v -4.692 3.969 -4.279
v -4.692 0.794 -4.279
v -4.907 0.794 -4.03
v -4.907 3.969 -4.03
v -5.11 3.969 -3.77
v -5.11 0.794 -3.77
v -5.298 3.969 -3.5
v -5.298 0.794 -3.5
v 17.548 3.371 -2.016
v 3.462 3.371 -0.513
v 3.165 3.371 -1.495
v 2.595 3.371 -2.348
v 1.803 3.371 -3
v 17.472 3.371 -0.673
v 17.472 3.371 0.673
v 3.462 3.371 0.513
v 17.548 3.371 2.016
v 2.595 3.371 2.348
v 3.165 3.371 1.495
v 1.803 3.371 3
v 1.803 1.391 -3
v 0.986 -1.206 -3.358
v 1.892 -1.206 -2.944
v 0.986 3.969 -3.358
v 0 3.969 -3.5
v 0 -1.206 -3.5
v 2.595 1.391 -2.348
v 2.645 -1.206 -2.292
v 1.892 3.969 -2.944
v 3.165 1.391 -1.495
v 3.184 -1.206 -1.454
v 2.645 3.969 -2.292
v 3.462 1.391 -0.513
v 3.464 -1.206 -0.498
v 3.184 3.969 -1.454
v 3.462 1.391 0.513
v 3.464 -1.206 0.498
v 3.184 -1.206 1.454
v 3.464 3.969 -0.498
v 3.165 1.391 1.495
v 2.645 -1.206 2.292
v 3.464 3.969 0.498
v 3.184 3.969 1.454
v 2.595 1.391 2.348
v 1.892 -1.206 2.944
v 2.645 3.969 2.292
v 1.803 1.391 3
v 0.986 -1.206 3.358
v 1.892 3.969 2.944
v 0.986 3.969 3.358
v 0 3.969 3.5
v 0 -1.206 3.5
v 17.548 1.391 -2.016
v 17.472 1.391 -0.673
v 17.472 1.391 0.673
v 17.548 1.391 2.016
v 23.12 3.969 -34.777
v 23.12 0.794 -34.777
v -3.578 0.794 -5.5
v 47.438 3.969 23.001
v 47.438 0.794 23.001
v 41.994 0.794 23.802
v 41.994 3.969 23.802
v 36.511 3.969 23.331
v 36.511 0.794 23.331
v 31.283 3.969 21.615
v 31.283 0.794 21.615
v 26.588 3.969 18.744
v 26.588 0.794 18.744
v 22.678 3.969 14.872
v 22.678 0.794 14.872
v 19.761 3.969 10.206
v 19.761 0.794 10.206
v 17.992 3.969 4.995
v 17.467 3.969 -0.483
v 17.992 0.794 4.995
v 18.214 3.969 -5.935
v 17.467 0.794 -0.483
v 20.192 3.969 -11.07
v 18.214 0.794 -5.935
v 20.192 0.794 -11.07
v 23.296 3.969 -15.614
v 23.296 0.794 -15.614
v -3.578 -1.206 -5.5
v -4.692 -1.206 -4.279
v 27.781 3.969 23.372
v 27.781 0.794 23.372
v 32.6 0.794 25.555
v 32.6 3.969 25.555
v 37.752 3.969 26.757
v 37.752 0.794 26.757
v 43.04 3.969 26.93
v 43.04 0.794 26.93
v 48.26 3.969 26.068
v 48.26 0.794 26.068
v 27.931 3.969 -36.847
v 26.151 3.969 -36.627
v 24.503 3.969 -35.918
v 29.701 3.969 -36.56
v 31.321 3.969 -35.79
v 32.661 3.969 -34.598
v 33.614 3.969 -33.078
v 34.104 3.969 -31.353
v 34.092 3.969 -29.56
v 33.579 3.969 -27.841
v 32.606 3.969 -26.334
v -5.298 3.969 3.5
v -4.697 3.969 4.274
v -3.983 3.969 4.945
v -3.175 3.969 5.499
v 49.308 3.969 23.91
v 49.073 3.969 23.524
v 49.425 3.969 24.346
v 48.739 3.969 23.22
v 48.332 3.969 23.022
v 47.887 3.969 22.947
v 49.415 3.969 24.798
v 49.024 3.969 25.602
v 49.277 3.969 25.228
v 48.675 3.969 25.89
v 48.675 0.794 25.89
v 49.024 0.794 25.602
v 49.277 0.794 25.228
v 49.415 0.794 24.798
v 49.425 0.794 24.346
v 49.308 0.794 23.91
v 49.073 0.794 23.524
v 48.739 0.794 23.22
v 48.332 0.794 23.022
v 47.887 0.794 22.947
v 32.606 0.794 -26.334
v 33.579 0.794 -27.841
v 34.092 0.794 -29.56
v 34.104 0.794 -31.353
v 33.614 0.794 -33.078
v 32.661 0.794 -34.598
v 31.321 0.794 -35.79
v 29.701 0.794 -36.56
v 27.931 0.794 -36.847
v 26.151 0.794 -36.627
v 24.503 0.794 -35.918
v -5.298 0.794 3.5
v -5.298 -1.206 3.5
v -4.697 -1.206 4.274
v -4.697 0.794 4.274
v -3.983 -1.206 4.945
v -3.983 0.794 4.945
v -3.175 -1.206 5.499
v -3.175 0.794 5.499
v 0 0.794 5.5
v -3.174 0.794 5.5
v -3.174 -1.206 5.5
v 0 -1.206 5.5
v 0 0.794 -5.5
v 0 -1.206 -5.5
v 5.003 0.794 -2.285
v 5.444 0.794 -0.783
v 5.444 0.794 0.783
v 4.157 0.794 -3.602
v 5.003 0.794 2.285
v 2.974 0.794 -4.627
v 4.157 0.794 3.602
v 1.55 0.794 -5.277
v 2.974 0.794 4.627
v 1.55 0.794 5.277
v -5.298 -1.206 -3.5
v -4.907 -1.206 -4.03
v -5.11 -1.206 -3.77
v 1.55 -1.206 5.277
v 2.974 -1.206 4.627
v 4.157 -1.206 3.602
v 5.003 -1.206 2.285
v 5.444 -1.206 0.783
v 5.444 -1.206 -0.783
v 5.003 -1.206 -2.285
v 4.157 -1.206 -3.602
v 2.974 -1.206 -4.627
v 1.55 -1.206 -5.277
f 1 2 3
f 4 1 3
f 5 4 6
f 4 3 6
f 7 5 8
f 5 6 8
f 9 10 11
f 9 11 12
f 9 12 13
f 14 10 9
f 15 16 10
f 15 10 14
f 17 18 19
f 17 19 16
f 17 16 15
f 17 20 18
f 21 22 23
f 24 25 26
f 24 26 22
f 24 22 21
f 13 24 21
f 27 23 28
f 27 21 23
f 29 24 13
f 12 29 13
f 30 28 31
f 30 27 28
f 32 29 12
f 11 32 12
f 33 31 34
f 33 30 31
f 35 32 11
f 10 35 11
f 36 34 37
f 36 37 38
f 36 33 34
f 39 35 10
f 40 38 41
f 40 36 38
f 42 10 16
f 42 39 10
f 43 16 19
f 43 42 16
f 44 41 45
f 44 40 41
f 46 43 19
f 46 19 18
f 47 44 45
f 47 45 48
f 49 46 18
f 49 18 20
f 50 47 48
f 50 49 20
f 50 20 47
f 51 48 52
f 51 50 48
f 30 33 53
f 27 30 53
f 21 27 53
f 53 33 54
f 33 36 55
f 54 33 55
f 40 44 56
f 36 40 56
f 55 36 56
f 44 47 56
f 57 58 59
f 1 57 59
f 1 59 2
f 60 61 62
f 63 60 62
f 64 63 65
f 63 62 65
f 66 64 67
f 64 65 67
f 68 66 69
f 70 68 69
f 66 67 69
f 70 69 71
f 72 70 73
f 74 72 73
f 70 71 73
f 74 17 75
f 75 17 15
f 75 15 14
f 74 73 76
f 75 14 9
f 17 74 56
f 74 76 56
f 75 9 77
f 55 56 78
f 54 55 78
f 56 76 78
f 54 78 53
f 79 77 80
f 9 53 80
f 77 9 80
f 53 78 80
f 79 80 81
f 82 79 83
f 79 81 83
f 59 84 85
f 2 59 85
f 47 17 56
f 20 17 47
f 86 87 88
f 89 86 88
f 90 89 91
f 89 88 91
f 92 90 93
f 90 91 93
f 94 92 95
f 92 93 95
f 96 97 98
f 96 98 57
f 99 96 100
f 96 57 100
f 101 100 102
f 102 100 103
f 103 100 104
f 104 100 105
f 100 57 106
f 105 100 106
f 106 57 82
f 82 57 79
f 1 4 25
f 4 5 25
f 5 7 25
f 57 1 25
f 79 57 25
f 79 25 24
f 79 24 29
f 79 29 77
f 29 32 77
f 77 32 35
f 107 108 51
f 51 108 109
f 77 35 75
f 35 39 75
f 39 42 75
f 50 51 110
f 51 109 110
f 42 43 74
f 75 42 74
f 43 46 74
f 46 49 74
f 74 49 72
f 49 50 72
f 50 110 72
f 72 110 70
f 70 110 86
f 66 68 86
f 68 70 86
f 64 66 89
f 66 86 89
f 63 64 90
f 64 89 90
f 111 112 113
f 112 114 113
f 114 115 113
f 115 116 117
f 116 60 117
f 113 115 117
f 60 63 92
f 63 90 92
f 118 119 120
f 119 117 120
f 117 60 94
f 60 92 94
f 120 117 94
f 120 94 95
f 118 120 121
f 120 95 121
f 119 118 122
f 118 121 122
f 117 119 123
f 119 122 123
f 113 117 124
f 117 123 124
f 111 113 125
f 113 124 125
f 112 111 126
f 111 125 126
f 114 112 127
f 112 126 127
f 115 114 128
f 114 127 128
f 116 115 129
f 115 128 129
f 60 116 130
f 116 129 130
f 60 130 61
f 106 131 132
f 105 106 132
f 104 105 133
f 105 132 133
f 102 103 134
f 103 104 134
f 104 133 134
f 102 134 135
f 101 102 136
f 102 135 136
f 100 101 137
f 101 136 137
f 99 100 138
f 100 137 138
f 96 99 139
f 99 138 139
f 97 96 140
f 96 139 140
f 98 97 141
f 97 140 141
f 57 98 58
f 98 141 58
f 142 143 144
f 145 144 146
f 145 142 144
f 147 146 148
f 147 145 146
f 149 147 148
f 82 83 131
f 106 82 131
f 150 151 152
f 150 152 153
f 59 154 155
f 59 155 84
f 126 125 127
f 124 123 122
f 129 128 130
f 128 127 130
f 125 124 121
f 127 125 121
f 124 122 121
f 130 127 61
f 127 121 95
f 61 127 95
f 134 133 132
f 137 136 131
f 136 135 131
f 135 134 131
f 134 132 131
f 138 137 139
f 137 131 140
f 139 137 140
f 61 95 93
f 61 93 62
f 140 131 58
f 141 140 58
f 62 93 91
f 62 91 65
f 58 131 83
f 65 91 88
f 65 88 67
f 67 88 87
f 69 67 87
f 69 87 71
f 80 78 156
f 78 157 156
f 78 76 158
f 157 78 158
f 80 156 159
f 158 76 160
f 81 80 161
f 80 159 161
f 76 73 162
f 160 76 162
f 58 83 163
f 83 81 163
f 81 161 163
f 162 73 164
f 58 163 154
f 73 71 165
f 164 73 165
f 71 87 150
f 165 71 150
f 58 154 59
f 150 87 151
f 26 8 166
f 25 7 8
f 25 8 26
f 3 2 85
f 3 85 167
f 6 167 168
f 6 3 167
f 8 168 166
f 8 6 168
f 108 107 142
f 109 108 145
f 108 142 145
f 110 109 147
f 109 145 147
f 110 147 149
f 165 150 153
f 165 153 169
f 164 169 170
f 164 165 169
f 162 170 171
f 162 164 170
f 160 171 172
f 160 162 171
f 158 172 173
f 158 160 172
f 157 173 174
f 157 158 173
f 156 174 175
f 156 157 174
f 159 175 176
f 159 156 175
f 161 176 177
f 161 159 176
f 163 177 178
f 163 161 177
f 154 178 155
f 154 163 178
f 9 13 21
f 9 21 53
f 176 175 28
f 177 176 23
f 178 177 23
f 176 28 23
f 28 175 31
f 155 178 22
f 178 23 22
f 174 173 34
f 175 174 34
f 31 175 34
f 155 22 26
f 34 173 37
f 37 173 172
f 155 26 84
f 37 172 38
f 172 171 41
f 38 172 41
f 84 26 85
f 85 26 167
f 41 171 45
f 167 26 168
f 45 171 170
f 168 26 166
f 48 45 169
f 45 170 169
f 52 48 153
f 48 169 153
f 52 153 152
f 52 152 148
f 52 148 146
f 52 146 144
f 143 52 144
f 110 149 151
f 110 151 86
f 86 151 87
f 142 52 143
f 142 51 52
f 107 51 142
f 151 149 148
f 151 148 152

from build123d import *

# Parameters (mm, degrees)
BOSS_EXTRUDE1_DEPTH = 4.7625
SKETCH5_R           = 3.5000057
CUT_EXTRUDE2_DEPTH  = 3.37125
CUT_EXTRUDE3_DEPTH  = 1.98
SKETCH10_W          = 6.35
SKETCH10_H          = 0.79375
SKETCH10_W_2        = 35.745198541
SKETCH10_W_3        = 19.548012242
CUT_EXTRUDE4_DEPTH  = 63.97959256
CUT_EXTRUDE5_DEPTH  = 2.54
BOSS_EXTRUDE2_DEPTH = 2


with BuildPart() as part:
    # Sketch1 → Boss-Extrude1 (new body)
    with BuildSketch(Plane(origin=(0, 0, 0), x_dir=(1, 0, 0), z_dir=(0, 1, 0))):
        with BuildLine():
            ThreePointArc((47.438128512, -23.001108739), (21.083895316, -12.623567162), (23.295952901, 15.613744639))
            Line((23.295952901, 15.613744639), (32.606191406, 26.334377035))
            ThreePointArc((32.606191406, 26.334377035), (32.033289602, 35.241600739), (23.119772343, 34.776777479))
            Line((23.119772343, 34.776777479), (-4.692006503, 4.278735207))
            ThreePointArc((-4.692006503, 4.278735207), (-6.274930424, -0.973523588), (-3.175, -5.499261314))
            Line((-3.175, -5.499261314), (27.78125, -23.371860585))
            ThreePointArc((27.78125, -23.371860585), (37.752424387, -26.756618196), (48.25987898, -26.067923237))
            ThreePointArc((48.25987898, -26.067923237), (49.382410995, -24.123640754), (47.438128512, -23.001108739))
        make_face()
    extrude(amount=BOSS_EXTRUDE1_DEPTH)

    # Sketch5 → Cut-Extrude2 (cut)
    with BuildSketch(Plane.XZ):
        Circle(SKETCH5_R)
        with BuildLine():
            ThreePointArc((0, -3.5000057), (-3.5000057, 0), (0, 3.5000057))
            Line((0, 3.5000057), (-5.298345034, 3.5000057))
            ThreePointArc((-5.298345034, 3.5000057), (-6.35, 0), (-5.298345034, -3.5000057))
            Line((-5.298345034, -3.5000057), (0, -3.5000057))
        make_face()
    extrude(amount=-CUT_EXTRUDE2_DEPTH, mode=Mode.SUBTRACT)

    # Sketch6 → Cut-Extrude3 (cut)
    with BuildSketch(Plane.XZ.offset(-3.37125)):
        with BuildLine():
            Line((17.802786704, -2), (17.802786704, 2))
            Line((17.802786704, 2), (1.802786704, 3))
            ThreePointArc((1.802786704, 3), (3.5000057, 0), (1.802786704, -3))
            Line((1.802786704, -3), (17.802786704, -2))
        make_face()
    extrude(amount=CUT_EXTRUDE3_DEPTH, mode=Mode.SUBTRACT)

    # Sketch10 → Cut-Extrude4 (cut, through all)
    with BuildSketch(Plane(origin=(-3.175, 0, 5.499261314), x_dir=(0.866025404, 0, 0.5), z_dir=(-0.5, 0, 0.866025404))):
        with Locations((-3.175, 4.365625)):
            Rectangle(SKETCH10_W, SKETCH10_H)
        with Locations((17.872599271, 4.365625)):
            Rectangle(SKETCH10_W_2, SKETCH10_H)
        with Locations((45.519204662, 4.365625)):
            Rectangle(SKETCH10_W_3, SKETCH10_H)
        with Locations((45.519204662, 0.396875)):
            Rectangle(SKETCH10_W_3, SKETCH10_H)
        with Locations((17.872599271, 0.396875)):
            Rectangle(SKETCH10_W_2, SKETCH10_H)
        with Locations((-3.175, 0.396875)):
            Rectangle(SKETCH10_W, SKETCH10_H)
    extrude(amount=-CUT_EXTRUDE4_DEPTH, mode=Mode.SUBTRACT)

    # Sketch11 → Cut-Extrude5 (cut)
    with BuildSketch(Plane.XZ.offset(-3.37125)):
        with BuildLine():
            Line((-5.298345034, 3.5000057), (0, 3.5000057))
            ThreePointArc((0, 3.5000057), (3.5000057, 0), (0, -3.5000057))
            Line((0, -3.5000057), (-5.298345034, -3.5000057))
            ThreePointArc((-5.298345034, -3.5000057), (-6.35, 0), (-5.298345034, 3.5000057))
        make_face()
    extrude(amount=-CUT_EXTRUDE5_DEPTH, mode=Mode.SUBTRACT)

    # Sketch12 → Boss-Extrude2 (add)
    with BuildSketch(Plane.XZ.offset(-0.79375)):
        with BuildLine():
            Line((-3.175, 5.499261314), (-3.173710686, 5.5000057))
            Line((-3.173710686, 5.5000057), (0, 5.5000057))
            ThreePointArc((0, 5.5000057), (5.5000057, 0), (0, -5.5000057))
            Line((0, -5.5000057), (-3.57830535, -5.5000057))
            Line((-3.57830535, -5.5000057), (-4.692006503, -4.278735207))
            ThreePointArc((-4.692006503, -4.278735207), (-5.010327921, -3.901168303), (-5.298345034, -3.5000057))
            Line((-5.298345034, -3.5000057), (0, -3.5000057))
            ThreePointArc((0, -3.5000057), (3.5000057, 0), (0, 3.5000057))
            Line((0, 3.5000057), (-5.298345034, 3.5000057))
            ThreePointArc((-5.298345034, 3.5000057), (-4.353004683, 4.623186156), (-3.175, 5.499261314))
        make_face()
    extrude(amount=BOSS_EXTRUDE2_DEPTH)


solid = part.part
